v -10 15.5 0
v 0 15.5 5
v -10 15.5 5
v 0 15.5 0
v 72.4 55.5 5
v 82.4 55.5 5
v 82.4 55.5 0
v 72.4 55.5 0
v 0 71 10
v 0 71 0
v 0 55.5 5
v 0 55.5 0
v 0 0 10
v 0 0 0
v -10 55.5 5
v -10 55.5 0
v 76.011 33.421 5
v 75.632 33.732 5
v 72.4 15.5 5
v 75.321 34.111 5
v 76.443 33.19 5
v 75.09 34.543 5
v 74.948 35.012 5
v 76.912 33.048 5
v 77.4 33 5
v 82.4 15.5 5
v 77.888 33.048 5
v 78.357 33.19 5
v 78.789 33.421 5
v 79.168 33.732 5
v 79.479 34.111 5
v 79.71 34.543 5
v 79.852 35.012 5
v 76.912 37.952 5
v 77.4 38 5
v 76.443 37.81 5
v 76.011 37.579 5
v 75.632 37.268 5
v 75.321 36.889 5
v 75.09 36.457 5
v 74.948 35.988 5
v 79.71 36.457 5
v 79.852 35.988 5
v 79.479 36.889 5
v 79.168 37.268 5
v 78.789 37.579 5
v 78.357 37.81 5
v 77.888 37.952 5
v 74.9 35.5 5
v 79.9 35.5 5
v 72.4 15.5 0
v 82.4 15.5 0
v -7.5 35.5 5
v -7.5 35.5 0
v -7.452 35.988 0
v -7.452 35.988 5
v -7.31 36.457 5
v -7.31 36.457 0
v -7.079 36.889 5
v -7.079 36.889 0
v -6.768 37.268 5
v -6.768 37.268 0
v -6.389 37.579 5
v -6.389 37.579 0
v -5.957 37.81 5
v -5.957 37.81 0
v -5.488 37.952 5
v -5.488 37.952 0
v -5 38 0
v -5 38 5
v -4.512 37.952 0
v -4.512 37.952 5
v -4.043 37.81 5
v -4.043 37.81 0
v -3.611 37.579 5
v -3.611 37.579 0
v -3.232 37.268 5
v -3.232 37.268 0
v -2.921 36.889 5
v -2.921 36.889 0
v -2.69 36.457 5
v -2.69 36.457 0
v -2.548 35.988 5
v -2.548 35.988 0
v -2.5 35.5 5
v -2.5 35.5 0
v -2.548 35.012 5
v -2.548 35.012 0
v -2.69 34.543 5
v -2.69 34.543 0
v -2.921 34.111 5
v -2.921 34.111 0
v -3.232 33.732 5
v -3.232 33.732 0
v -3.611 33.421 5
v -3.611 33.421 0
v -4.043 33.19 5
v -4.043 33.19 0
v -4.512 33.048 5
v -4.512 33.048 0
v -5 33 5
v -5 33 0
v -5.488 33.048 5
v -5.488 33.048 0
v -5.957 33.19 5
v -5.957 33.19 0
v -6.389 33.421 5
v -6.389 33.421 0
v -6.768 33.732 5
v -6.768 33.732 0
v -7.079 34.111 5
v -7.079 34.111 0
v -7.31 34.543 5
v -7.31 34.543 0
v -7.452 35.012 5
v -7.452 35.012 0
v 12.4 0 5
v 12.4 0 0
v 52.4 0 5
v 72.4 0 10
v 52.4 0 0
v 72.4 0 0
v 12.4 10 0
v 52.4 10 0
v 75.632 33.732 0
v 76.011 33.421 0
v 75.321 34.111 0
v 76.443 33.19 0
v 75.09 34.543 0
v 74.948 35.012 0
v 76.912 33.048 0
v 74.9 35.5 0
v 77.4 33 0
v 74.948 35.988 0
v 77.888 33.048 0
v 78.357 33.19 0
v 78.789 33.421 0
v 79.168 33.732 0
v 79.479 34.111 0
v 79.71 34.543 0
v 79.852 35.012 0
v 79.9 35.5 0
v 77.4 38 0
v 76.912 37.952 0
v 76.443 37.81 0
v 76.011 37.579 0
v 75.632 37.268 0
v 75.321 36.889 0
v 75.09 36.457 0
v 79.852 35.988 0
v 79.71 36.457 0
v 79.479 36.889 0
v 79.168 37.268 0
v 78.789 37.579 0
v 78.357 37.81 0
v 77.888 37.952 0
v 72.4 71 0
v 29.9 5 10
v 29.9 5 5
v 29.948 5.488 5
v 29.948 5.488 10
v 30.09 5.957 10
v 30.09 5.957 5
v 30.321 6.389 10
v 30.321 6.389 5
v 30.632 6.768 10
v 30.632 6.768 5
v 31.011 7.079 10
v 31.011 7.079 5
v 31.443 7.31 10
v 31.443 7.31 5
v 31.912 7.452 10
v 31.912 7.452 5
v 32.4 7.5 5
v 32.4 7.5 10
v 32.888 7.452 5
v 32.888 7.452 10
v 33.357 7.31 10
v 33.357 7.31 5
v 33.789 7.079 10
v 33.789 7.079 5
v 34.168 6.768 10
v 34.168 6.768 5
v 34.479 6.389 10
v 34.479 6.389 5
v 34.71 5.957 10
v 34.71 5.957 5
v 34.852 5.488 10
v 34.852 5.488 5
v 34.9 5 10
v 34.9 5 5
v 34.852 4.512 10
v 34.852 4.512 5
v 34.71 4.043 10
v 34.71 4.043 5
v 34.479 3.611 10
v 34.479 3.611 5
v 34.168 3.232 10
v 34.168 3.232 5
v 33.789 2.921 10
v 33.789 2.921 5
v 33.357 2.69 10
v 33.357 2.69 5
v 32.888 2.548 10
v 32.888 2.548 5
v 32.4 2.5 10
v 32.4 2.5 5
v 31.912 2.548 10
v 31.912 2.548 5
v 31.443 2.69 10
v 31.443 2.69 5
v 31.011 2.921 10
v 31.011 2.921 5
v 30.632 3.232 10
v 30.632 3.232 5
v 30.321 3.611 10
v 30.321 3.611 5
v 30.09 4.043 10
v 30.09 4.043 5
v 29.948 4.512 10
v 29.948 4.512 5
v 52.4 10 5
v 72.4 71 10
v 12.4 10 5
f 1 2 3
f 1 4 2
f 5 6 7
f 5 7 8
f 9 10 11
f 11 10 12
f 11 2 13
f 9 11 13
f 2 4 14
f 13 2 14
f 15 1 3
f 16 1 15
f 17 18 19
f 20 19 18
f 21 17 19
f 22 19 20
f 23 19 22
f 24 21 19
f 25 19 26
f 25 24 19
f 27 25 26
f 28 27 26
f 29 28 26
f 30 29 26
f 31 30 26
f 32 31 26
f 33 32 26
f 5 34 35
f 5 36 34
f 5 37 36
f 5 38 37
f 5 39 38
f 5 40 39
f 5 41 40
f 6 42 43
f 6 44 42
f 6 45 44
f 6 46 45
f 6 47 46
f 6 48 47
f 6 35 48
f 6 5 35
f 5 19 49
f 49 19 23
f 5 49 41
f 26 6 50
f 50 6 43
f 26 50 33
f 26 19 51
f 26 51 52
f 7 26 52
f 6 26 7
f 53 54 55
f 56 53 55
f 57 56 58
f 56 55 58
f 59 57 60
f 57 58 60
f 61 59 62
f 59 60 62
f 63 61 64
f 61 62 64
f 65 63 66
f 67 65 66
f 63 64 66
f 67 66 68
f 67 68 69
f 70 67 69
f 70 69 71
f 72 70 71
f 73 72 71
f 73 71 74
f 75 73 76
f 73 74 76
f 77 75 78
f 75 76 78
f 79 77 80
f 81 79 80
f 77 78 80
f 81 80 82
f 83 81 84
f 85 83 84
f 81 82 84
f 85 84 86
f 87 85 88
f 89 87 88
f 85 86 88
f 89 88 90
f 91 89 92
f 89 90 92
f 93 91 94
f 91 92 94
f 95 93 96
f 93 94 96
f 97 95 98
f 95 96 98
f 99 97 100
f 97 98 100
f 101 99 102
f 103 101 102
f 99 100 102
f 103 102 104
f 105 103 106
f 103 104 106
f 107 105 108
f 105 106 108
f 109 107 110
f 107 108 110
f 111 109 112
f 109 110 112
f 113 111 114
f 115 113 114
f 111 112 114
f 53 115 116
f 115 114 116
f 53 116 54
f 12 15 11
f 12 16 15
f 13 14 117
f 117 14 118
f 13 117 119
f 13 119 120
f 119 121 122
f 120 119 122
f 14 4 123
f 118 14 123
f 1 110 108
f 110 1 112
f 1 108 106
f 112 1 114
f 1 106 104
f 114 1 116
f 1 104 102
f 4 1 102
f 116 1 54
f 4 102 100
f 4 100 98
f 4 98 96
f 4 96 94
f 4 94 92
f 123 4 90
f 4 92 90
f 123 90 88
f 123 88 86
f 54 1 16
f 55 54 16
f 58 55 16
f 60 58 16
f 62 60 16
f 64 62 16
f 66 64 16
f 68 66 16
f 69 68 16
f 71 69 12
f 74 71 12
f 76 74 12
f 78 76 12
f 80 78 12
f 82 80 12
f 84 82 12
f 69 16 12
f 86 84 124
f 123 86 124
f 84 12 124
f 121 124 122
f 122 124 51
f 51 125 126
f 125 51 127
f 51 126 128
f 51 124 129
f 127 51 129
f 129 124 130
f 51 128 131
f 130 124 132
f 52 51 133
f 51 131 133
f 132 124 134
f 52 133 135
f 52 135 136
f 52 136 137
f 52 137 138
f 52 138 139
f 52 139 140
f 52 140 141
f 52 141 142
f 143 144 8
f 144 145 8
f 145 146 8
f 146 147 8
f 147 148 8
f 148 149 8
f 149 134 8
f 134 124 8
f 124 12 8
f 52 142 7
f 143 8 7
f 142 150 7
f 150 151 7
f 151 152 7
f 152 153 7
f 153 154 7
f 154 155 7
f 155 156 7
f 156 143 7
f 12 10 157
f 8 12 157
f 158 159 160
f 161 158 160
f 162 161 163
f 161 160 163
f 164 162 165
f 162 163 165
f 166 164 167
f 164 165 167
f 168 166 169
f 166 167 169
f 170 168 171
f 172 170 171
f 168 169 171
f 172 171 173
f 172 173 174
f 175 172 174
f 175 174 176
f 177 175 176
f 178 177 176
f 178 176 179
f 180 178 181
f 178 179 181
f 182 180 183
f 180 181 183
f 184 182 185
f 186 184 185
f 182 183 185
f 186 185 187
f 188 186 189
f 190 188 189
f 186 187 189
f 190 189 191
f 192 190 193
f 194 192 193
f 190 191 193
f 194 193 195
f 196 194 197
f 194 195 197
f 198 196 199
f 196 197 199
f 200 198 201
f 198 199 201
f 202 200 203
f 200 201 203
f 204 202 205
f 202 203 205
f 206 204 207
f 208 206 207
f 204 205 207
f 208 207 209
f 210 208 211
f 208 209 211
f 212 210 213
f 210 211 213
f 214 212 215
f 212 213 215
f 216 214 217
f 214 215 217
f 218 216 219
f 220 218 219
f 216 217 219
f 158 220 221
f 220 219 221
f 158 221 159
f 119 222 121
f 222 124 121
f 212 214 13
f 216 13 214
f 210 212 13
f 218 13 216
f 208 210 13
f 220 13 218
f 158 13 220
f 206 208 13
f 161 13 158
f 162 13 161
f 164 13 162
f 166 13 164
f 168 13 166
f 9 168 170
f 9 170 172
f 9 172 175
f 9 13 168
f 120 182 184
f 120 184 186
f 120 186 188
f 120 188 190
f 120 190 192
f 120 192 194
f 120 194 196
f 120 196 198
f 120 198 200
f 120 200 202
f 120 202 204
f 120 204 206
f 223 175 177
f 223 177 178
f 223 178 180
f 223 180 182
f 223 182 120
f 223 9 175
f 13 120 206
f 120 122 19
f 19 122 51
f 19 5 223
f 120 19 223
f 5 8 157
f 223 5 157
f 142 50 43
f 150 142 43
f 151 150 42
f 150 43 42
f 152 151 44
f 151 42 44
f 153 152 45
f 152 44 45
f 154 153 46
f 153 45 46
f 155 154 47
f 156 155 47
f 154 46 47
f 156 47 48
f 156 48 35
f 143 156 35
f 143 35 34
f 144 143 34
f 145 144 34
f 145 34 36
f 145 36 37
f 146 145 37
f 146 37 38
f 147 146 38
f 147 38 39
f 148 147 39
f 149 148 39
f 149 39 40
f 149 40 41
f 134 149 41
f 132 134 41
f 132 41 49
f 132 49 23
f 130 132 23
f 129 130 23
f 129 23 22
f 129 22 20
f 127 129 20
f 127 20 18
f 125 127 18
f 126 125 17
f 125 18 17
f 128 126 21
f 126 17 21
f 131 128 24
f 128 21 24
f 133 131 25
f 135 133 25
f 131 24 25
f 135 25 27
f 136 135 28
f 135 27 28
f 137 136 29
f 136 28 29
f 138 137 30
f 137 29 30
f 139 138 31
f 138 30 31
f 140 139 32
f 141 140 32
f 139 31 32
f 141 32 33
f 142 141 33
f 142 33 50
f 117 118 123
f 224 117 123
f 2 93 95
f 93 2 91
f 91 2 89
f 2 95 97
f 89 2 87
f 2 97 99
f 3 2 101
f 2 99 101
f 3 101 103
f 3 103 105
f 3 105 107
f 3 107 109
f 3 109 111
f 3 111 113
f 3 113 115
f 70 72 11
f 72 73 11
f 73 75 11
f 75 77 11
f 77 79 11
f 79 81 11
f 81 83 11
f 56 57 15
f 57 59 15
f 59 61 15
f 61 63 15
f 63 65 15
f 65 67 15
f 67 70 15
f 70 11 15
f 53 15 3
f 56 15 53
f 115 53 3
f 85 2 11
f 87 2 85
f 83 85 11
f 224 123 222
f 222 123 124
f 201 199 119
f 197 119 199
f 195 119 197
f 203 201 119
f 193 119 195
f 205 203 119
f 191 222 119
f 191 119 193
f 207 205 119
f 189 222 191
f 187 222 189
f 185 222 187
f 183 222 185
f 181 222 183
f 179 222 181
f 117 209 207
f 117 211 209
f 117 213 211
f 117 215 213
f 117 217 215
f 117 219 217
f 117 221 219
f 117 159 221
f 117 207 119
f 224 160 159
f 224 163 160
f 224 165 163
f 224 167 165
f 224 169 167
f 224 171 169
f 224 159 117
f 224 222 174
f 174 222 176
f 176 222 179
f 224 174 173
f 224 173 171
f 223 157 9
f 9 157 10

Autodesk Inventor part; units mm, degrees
ref_plane "YZ Plane" through (0, 0, 0) normal (1, 0, 0) x (0, 1, 0)
ref_plane "XZ Plane" through (0, 0, 0) normal (0, 1, 0) x (-1, 0, 0)
ref_plane "XY Plane" through (0, 0, 0) normal (0, 0, 1) x (1, 0, 0)
sketch "Sketch1" plane through (0, 0, 0) normal (0, 0, 1) x (1, 0, 0)
  line L0 (0, 0) -> (72.4, 0)
  line L1 (72.4, 0) -> (72.4, 71)
  line L2 (72.4, 71) -> (0, 71)
  line L3 (0, 71) -> (0, 0)
  dimension "d0" = 72.4
  dimension "d1" = 71
extrude "Extrusion1" add sketch "Sketch1" along normal blind 10
sketch "Sketch2" plane through (0, 0, 10) normal (0, 0, 1) x (1, 0, 0)
  line L0 (72.4, 0) -> (72.4, 71) projected
  line L1 (72.4, 15.5) -> (82.4, 15.5)
  line L2 (82.4, 15.5) -> (82.4, 55.5)
  line L3 (82.4, 55.5) -> (72.4, 55.5)
  line L4 (72.4, 55.5) -> (72.4, 15.5)
  line L5 (72.4, 71) -> (0, 71) projected
  circle A0 centre (77.4, 35.5) radius 2.5
  line L6 (0, 0) -> (72.4, 0) projected
  point P0 (82.4, 35.5)
  point P1 (77.4, 55.5)
  dimension "d4" = 10
  dimension "d5" = 40
  dimension "d7" = 5
  dimension "d31" = 15.5
extrude "Extrusion2" add sketch "Sketch2" against normal blind 10
sketch "Sketch3" plane through (0, 0, 10) normal (0, 0, 1) x (1, 0, 0)
  line L0 (72.4, 55.5) -> (82.4, 55.5) projected
  line L1 (72.4, 15.5) -> (82.4, 15.5) projected
  line L2 (82.4, 55.5) -> (72.4, 55.5)
  line L3 (72.4, 55.5) -> (72.4, 15.5)
  line L4 (72.4, 15.5) -> (82.4, 15.5)
  line L5 (82.4, 15.5) -> (82.4, 55.5)
  point P0 (0, 0)
extrude "Extrusion3" cut sketch "Sketch3" against normal blind 5
sketch "Sketch8" plane through (0, 0, 0) normal (0, 0, -1) x (-1, 0, 0)
  line L0 (-12.4, 10) -> (-52.4, 10)
  line L1 (-52.4, 10) -> (-52.4, 0)
  line L2 (-52.4, 0) -> (-12.4, 0)
  line L3 (-12.4, 0) -> (-12.4, 10)
  line L4 (0, 0) -> (-72.4, 0) projected
  line L5 (-72.4, 0) -> (-72.4, 15.5) projected
  line L6 (-72.4, 71) -> (0, 71) projected
  point P0 (-36.2, 0)
  point P1 (-32.4, 10)
  point P2 (-32.4, 0)
  dimension "d32" = 40
  dimension "d33" = 10
  dimension "d34" = 20
extrude "Extrusion8" cut sketch "Sketch8" against normal blind 5
sketch "Sketch9" plane through (0, 0, 5) normal (0, 0, -1) x (-1, 0, 0)
  line L0 (-52.4, 0) -> (-52.4, 10) construction
  line L1 (-12.4, 10) -> (-12.4, 0) construction
  circle A0 centre (-32.4, 5) radius 2.5
  line L2 (-52.4, 10) -> (-12.4, 10) projected
  line L3 (-12.4, 0) -> (-52.4, 0) projected
  point P0 (0, 0)
  point P1 (-32.4, 0)
  point P2 (-12.4, 5)
  dimension "d37" = 5
extrude "Extrusion9" cut sketch "Sketch9" against normal through all
sketch "Sketch10" plane through (0, 0, 0) normal (0, 0, -1) x (-1, 0, 0)
  line L0 (0, 71) -> (0, 0) projected
  line L1 (0, 15.5) -> (10, 15.5)
  line L2 (10, 15.5) -> (10, 55.5)
  line L3 (10, 55.5) -> (0, 55.5)
  line L4 (0, 55.5) -> (0, 15.5)
  circle A0 centre (5, 35.5) radius 2.5
  point P0 (-82.4, 15.5)
  point P1 (10, 35.5)
  point P2 (5, 15.5)
  dimension "d40" = 10
  dimension "d41" = 40
  dimension "d42" = 5
extrude "Extrusion10" add sketch "Sketch10" against normal blind 5
properties part number "SP002" material "ABS Plastic"
